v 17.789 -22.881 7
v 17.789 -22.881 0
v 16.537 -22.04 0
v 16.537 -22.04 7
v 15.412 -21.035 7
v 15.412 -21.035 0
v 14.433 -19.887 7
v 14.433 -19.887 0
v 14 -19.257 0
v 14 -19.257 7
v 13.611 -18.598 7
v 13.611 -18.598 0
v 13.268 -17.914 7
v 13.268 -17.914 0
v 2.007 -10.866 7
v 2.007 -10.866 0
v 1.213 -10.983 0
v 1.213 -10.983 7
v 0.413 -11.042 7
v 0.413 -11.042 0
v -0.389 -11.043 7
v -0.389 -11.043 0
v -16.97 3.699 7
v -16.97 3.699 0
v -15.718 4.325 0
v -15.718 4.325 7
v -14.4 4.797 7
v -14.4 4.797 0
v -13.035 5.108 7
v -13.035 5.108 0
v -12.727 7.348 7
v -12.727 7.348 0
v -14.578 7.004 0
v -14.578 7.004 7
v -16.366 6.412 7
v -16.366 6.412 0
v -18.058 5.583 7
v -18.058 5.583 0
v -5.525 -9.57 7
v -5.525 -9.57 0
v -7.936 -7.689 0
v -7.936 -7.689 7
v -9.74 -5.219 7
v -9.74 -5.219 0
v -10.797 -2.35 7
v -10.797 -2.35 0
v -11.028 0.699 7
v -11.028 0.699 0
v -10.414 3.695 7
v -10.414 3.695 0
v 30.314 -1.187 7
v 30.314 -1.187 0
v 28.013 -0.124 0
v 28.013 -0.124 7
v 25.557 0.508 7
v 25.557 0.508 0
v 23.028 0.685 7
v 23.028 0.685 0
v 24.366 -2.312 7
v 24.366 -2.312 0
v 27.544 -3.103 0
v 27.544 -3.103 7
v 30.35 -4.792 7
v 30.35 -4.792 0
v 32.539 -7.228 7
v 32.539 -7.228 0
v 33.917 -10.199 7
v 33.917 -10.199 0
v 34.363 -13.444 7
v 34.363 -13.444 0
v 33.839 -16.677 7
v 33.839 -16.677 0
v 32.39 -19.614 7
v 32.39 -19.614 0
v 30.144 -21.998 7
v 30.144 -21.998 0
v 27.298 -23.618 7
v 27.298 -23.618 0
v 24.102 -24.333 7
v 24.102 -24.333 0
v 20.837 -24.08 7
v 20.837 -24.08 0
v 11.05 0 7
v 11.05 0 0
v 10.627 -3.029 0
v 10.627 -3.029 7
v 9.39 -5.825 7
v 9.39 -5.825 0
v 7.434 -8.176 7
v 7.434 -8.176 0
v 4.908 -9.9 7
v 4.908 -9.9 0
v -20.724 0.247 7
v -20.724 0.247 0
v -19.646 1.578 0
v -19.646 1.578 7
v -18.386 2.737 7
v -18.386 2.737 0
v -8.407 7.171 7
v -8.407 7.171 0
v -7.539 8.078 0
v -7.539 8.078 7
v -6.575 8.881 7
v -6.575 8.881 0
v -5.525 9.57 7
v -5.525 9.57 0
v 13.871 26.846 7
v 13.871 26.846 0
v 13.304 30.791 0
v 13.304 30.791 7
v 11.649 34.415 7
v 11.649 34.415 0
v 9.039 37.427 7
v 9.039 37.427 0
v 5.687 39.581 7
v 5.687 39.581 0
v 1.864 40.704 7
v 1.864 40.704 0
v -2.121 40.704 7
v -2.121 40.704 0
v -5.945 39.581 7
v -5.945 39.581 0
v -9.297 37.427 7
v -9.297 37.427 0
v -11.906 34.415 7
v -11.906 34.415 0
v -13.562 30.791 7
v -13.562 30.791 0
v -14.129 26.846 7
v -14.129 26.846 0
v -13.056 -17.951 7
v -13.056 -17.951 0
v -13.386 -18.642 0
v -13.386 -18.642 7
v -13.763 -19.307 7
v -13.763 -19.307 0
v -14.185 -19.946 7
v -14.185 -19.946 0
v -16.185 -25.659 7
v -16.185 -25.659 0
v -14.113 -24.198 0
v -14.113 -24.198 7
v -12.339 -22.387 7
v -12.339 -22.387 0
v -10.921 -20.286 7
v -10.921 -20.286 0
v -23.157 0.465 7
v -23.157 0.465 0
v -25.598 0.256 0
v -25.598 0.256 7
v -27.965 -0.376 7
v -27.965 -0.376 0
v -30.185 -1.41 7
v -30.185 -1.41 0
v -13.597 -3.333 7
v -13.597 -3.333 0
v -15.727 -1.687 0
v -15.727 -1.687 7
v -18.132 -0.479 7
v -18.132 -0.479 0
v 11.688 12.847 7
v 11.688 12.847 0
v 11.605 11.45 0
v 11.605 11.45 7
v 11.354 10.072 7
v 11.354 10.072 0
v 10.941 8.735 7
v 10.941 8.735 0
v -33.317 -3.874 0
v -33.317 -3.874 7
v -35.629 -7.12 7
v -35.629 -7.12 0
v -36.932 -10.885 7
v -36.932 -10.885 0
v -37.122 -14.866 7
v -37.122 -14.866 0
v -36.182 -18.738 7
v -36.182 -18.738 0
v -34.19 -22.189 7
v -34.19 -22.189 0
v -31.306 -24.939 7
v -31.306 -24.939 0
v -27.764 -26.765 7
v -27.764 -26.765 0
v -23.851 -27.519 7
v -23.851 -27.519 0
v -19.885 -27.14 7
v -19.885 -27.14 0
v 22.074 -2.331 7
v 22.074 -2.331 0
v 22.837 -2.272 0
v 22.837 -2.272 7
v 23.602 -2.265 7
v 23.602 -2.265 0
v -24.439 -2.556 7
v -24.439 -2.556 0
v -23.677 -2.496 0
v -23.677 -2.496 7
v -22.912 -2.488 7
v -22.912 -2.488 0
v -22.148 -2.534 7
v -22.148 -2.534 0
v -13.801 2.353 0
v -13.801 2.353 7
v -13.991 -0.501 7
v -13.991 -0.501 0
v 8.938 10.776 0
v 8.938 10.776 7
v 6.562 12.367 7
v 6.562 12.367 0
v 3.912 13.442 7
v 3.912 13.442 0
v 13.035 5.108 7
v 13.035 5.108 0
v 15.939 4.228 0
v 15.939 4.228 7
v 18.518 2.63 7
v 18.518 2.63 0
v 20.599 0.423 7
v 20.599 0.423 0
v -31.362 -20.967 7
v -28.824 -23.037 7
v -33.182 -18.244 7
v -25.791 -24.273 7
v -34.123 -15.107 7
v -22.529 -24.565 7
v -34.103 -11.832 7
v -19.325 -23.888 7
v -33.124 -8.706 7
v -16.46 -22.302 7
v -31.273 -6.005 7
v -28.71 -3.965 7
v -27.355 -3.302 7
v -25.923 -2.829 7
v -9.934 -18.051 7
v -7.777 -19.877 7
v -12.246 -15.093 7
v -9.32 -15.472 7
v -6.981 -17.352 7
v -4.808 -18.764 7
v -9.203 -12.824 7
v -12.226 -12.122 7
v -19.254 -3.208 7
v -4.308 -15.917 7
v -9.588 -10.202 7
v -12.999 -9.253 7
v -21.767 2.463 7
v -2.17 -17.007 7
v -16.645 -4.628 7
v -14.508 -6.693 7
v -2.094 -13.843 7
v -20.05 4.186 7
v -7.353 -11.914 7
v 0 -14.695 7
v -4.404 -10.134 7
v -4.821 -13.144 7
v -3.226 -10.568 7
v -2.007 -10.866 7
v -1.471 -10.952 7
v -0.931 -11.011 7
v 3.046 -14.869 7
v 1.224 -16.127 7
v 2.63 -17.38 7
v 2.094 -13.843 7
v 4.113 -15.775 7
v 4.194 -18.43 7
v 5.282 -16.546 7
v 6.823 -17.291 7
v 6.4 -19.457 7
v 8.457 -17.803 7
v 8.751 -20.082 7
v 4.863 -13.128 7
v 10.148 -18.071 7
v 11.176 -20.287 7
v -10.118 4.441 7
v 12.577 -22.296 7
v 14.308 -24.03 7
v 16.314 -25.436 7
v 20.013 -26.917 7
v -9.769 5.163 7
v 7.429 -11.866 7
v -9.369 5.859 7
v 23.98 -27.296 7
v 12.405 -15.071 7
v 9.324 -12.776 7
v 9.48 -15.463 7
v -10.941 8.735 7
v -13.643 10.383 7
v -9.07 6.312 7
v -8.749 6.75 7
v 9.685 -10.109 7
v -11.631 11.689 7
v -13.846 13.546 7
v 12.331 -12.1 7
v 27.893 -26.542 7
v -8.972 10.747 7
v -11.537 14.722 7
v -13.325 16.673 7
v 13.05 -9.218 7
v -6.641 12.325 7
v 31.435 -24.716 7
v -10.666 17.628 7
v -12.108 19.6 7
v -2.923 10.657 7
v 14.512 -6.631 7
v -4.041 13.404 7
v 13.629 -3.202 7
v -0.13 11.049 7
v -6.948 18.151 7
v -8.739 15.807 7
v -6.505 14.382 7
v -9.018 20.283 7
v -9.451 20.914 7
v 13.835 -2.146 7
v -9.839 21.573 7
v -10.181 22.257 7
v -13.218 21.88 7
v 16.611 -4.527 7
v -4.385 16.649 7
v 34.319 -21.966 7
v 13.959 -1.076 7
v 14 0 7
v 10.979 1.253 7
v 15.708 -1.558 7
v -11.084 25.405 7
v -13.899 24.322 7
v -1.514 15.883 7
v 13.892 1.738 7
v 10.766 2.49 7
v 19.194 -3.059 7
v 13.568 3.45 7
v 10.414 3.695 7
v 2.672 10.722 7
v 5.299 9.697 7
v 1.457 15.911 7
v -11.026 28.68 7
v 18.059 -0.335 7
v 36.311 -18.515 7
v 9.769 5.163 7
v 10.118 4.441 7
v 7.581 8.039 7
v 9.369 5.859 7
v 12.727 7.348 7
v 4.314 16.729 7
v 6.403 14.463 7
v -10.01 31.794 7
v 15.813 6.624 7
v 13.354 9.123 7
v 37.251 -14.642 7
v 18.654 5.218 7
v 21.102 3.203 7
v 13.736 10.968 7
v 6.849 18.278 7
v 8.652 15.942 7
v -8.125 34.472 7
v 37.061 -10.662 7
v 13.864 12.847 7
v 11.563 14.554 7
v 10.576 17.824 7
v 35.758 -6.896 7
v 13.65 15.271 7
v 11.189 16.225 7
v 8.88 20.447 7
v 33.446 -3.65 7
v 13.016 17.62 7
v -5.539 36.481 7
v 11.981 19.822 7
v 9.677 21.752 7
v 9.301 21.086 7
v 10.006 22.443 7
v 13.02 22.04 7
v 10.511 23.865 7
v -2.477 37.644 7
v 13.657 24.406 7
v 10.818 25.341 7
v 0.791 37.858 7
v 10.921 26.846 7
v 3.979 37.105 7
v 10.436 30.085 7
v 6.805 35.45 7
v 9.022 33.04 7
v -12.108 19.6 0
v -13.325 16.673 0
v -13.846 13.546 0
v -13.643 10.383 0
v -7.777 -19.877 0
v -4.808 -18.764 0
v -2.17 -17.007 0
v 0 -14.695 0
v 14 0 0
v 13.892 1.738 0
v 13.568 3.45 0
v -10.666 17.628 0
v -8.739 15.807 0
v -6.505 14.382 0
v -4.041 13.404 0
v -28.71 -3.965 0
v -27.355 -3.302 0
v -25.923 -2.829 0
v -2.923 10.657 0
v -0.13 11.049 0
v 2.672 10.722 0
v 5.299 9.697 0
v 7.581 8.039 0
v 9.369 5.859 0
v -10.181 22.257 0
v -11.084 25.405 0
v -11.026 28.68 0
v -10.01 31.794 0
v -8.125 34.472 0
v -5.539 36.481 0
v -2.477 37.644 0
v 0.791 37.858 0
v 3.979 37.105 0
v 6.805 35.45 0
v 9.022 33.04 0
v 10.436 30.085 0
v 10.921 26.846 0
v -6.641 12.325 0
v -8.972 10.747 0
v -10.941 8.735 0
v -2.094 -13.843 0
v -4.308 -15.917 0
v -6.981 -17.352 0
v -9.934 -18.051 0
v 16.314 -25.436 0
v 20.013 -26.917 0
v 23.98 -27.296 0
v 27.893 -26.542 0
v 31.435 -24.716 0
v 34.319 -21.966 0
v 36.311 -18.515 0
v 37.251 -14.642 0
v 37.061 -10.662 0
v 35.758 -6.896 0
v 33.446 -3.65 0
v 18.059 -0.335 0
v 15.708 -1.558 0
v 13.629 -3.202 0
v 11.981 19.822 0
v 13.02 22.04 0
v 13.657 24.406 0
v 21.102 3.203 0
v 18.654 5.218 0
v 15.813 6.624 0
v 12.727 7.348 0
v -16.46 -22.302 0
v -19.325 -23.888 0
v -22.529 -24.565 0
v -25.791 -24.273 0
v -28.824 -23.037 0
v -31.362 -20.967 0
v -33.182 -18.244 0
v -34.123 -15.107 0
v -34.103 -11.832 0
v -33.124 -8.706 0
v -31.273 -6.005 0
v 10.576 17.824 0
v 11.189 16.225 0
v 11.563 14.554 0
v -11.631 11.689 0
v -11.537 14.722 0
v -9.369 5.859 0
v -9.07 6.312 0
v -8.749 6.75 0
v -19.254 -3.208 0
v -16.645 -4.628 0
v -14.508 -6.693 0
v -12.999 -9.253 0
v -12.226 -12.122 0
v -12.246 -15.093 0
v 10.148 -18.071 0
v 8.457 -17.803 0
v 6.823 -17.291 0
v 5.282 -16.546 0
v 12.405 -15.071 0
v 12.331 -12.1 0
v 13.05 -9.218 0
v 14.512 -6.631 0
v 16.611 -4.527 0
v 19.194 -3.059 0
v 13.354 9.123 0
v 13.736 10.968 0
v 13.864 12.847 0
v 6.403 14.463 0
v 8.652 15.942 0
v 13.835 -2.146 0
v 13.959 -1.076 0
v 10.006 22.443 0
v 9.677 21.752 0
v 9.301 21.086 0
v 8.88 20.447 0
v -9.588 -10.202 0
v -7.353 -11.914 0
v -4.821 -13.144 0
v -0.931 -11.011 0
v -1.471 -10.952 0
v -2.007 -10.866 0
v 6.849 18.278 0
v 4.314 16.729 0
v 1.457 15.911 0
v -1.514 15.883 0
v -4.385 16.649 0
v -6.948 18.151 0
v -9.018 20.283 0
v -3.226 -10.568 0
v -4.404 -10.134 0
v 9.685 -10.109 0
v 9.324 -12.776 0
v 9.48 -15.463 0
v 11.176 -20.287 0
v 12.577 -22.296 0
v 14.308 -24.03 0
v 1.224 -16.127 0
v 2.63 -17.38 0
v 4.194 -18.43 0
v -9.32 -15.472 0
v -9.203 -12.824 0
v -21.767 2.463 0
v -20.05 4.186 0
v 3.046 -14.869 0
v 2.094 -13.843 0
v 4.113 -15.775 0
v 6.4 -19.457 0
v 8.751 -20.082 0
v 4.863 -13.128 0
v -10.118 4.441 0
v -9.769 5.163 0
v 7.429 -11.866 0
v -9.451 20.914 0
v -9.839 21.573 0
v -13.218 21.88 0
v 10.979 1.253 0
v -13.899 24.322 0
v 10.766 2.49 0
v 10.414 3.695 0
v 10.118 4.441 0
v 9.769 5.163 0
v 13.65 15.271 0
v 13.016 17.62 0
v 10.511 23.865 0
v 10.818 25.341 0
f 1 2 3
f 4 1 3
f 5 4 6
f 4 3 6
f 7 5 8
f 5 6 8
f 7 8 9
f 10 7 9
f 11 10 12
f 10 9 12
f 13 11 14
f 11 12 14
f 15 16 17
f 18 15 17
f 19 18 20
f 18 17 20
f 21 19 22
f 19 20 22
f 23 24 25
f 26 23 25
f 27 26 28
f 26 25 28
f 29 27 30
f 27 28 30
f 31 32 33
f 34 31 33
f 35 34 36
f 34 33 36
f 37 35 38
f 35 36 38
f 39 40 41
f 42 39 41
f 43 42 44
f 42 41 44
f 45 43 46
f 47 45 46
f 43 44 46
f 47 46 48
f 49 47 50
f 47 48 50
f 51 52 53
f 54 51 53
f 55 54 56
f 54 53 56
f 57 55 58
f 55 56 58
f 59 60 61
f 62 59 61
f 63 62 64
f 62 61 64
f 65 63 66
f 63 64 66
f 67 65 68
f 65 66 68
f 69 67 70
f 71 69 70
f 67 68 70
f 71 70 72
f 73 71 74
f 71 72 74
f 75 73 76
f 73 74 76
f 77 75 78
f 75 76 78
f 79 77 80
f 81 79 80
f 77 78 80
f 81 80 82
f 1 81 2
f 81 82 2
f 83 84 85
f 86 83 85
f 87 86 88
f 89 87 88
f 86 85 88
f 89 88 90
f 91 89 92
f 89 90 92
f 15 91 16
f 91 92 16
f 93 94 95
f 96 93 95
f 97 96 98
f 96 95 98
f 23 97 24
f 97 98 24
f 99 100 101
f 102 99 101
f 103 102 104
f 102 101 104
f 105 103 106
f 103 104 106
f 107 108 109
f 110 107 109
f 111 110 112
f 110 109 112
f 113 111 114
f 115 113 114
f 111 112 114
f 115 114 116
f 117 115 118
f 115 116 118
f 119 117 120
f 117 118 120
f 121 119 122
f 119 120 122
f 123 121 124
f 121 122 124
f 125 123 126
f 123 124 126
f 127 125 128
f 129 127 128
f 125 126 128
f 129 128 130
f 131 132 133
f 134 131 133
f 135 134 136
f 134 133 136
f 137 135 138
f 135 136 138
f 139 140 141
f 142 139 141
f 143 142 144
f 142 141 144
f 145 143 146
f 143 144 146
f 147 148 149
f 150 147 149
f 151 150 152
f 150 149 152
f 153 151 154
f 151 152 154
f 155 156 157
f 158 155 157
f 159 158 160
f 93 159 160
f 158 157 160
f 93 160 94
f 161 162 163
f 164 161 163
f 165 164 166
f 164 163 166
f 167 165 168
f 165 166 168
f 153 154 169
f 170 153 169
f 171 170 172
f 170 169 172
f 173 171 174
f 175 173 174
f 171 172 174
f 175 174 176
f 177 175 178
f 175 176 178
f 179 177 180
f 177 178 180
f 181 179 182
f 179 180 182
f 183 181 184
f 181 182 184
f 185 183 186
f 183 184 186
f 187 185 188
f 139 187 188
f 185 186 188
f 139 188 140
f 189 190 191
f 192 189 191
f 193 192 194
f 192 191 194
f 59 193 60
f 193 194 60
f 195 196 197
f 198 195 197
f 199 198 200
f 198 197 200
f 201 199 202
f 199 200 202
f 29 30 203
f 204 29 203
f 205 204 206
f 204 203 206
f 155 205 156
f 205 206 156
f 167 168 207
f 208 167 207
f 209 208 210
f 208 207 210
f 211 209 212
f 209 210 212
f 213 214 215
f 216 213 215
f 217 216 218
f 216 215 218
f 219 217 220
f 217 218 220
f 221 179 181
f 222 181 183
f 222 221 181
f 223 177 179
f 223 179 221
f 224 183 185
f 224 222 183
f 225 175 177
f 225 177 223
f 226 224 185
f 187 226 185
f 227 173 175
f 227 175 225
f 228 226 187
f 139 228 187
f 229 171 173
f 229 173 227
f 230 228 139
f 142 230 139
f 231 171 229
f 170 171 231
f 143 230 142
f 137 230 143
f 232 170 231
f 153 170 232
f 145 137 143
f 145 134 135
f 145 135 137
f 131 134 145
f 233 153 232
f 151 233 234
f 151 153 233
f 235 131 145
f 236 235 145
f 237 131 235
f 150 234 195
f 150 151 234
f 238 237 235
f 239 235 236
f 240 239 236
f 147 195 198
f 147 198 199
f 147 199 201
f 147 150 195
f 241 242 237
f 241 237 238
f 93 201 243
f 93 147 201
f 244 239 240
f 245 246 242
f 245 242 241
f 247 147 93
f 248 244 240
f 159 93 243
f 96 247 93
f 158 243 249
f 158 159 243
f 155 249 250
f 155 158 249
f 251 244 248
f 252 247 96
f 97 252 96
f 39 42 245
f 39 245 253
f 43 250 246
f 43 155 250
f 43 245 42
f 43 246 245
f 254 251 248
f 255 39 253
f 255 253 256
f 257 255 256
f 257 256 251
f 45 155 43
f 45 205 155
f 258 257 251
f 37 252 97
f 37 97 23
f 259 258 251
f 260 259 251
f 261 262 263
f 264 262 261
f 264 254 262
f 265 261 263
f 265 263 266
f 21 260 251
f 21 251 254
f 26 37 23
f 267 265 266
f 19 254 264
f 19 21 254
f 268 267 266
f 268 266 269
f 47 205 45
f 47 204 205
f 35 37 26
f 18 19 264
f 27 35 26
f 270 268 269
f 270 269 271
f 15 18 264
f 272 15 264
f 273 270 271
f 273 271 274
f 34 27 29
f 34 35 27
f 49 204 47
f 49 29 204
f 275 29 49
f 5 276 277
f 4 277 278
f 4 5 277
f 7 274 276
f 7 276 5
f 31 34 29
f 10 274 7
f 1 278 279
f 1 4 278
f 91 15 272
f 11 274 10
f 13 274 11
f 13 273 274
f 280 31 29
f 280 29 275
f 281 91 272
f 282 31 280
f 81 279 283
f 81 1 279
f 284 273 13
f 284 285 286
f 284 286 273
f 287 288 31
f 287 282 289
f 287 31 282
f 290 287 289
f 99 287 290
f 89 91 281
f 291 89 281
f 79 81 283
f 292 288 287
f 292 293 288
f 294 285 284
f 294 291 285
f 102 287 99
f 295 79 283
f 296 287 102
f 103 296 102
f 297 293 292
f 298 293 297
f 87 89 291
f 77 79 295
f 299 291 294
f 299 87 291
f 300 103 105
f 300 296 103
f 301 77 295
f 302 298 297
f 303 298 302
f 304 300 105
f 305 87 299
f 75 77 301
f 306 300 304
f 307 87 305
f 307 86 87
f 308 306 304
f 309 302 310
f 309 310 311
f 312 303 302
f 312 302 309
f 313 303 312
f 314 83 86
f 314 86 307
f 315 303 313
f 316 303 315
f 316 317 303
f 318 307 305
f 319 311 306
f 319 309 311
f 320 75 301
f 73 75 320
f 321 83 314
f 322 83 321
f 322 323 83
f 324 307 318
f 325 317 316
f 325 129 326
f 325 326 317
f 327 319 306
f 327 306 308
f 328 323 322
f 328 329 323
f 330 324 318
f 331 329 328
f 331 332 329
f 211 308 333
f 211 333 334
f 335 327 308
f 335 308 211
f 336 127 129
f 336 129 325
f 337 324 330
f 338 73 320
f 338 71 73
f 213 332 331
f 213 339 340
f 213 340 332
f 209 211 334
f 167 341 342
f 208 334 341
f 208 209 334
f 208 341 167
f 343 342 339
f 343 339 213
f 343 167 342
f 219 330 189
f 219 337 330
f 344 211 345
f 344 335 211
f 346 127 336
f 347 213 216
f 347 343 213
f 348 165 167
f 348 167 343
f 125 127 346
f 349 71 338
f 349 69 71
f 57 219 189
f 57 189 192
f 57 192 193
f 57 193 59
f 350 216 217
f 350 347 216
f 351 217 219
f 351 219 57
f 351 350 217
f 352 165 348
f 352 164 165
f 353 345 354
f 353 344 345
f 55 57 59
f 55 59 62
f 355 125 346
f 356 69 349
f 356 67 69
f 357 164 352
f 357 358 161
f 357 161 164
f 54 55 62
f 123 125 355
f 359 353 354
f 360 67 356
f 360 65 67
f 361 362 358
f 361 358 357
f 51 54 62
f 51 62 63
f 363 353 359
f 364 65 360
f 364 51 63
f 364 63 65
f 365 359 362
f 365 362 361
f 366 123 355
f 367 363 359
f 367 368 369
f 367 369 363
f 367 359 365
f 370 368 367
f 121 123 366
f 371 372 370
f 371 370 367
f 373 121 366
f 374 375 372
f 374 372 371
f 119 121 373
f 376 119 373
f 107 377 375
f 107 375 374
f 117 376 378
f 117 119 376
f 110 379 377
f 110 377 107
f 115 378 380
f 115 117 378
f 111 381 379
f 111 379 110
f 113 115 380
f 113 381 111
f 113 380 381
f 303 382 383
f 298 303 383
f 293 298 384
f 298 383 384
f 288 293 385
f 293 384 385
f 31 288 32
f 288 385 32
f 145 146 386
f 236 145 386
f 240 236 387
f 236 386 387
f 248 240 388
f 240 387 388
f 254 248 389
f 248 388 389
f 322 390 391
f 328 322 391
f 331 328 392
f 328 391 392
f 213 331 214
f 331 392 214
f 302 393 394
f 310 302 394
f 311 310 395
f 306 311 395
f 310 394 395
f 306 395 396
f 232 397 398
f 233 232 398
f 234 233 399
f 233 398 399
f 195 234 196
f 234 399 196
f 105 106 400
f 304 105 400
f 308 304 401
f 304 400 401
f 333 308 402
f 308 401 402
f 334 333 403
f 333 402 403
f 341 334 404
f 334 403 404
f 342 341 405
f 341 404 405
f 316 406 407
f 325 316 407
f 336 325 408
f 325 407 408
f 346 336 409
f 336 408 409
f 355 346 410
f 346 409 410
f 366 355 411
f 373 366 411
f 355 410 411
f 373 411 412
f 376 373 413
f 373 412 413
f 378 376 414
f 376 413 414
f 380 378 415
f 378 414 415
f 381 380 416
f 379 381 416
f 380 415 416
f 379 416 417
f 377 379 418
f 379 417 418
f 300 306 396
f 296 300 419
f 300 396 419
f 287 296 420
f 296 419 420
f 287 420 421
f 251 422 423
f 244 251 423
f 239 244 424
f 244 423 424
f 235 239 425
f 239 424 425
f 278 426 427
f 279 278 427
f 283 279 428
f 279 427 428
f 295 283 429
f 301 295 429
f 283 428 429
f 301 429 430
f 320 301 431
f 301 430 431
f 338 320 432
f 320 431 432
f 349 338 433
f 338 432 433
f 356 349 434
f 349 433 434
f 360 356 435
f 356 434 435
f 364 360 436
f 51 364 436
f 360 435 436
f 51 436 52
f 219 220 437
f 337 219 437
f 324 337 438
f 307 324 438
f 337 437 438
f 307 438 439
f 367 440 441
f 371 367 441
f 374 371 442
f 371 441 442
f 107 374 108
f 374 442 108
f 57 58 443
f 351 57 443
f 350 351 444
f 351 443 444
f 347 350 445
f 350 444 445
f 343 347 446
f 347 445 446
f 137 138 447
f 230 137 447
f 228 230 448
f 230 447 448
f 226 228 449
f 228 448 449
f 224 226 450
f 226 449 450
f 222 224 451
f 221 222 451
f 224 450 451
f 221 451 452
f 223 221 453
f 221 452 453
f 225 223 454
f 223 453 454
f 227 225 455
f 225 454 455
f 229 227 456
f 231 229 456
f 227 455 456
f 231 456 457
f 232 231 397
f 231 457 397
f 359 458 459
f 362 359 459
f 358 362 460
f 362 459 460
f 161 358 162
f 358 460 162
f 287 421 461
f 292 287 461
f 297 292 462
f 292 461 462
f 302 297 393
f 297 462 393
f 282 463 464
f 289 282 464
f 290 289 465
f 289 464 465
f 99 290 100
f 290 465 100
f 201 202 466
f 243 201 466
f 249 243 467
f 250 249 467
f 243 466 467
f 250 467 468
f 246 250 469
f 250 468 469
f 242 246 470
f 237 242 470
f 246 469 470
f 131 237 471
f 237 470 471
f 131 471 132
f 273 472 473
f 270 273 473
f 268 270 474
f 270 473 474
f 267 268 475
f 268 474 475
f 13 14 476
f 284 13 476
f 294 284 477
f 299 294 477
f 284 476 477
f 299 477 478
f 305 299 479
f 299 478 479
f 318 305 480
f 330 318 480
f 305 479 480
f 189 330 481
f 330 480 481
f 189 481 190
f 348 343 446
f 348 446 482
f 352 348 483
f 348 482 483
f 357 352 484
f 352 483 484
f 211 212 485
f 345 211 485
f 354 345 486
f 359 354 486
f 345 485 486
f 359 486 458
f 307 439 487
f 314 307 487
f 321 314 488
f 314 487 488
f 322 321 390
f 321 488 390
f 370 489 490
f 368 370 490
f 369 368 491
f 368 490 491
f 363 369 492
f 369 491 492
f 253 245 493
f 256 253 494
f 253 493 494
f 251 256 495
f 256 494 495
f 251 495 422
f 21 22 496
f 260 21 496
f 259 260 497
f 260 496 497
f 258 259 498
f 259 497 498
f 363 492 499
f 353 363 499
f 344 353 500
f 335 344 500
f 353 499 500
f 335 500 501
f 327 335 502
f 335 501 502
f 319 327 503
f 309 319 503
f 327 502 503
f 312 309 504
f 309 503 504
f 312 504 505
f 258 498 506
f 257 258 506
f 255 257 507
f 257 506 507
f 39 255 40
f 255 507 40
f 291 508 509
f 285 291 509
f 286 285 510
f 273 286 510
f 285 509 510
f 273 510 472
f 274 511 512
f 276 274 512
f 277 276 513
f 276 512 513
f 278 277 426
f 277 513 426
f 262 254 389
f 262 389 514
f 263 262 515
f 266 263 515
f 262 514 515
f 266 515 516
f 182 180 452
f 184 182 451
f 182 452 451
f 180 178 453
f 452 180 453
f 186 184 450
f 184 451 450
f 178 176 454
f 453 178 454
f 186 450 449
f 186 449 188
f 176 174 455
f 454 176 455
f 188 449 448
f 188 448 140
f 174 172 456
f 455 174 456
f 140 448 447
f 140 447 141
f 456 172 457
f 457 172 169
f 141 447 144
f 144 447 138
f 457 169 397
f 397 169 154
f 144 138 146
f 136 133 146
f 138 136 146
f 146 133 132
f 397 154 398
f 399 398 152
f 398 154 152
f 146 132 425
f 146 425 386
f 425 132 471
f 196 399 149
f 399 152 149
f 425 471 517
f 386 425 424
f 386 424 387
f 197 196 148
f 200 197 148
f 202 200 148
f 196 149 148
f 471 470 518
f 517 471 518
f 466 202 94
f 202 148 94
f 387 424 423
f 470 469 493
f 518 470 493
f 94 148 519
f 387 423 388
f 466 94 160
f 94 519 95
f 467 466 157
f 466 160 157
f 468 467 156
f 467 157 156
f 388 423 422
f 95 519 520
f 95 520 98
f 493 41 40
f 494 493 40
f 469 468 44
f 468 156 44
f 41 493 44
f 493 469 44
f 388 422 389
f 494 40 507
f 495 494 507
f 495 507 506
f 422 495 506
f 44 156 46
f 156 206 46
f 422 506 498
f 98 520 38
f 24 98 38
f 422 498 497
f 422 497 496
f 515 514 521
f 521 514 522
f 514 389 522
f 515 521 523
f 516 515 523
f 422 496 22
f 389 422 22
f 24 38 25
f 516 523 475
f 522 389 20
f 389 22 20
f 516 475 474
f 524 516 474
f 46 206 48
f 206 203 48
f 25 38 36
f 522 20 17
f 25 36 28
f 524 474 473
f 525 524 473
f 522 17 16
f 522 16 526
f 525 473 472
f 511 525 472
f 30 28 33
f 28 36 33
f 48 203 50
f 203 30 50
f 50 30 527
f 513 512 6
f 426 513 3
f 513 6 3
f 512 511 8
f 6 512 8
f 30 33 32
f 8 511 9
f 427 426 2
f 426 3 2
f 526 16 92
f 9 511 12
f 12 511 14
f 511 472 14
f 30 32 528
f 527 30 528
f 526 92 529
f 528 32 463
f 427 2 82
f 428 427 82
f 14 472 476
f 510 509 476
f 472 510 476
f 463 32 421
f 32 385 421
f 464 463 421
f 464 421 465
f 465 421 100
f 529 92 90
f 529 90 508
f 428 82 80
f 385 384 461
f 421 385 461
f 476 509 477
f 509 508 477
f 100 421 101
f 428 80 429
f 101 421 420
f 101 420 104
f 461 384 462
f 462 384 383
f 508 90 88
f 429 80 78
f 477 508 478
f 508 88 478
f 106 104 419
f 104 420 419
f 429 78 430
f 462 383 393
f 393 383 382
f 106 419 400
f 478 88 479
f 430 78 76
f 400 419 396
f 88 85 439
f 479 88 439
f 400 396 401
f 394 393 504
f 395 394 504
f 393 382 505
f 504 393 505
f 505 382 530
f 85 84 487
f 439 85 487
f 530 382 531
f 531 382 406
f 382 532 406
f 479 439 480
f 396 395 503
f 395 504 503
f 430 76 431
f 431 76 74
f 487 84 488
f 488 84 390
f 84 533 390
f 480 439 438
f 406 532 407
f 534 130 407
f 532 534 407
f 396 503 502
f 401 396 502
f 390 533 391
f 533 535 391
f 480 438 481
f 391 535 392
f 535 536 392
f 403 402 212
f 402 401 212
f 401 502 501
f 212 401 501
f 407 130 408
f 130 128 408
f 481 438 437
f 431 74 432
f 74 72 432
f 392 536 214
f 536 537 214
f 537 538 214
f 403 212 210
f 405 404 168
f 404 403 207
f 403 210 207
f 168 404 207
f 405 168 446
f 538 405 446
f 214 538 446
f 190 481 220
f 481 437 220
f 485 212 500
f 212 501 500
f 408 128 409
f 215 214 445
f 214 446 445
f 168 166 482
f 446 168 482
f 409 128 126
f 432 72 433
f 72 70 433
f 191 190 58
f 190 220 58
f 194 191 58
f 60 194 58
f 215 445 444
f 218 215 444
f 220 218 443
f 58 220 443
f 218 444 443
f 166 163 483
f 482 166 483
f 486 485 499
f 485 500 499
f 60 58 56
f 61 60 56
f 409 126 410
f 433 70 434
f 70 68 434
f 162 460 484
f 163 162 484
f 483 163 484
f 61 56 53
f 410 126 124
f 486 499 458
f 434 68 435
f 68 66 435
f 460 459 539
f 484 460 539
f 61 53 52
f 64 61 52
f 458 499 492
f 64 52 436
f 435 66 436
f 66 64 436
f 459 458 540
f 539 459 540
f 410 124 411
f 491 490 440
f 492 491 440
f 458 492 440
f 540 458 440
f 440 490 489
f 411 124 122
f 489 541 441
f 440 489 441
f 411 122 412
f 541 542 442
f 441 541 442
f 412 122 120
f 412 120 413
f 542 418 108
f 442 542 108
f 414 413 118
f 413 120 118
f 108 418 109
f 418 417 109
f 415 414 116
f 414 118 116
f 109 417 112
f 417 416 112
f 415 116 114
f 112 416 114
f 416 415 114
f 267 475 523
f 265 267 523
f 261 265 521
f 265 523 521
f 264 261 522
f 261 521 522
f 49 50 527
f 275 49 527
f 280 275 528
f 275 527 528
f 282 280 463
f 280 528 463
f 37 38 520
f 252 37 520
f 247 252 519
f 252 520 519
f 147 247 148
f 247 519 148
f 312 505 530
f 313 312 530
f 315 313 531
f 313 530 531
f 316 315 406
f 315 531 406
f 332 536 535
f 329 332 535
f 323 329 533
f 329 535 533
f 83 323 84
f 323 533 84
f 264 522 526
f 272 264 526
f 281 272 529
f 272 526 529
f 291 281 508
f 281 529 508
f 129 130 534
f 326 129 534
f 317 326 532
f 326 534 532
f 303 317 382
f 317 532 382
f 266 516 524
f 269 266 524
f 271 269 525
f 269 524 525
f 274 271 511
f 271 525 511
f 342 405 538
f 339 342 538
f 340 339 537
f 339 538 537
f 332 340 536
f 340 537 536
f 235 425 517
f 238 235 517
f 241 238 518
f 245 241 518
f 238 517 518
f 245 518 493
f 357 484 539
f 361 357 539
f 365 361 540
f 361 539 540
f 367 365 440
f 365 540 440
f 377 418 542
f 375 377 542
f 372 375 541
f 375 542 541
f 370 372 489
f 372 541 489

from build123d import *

# Parameters (mm, degrees)
F1_DEPTH = 7
F2_DEPTH = 7
F3_COUNT = 3


with BuildPart() as f1:
    # F0 (on Top) → F1 (new body)
    with BuildSketch(Plane.XY):
        with BuildLine():
            ThreePointArc((11.9814563539, 19.822065477), (13.3904833189, 23.2093401836), (13.8711614234, 26.8463630714))
            Line((13.8711614234, 26.8463630714), (10.9211614234, 26.8463630714))
            ThreePointArc((10.9211614234, 26.8463630714), (10.6899476462, 24.5977268922), (10.0059822983, 22.4431930958))
            ThreePointArc((10.0059822983, 22.4431930958), (11.0715600581, 21.1912957723), (11.9814563539, 19.822065477))
        make_face()
        with BuildLine():
            Line((10.9211614234, 26.8463630714), (13.8711614234, 26.8463630714))
            ThreePointArc((13.8711614234, 26.8463630714), (-0.1288385766, 40.8463630714), (-14.1288385766, 26.8463630714))
            Line((-14.1288385766, 26.8463630714), (-11.1788385766, 26.8463630714))
            ThreePointArc((-11.1788385766, 26.8463630714), (-0.1288385766, 37.8963630714), (10.9211614234, 26.8463630714))
        make_face()
        with BuildLine():
            Line((-11.1788385766, 26.8463630714), (-14.1288385766, 26.8463630714))
            ThreePointArc((-14.1288385766, 26.8463630714), (-13.6141173472, 23.0850791844), (-12.1078019368, 19.6003685354))
            ThreePointArc((-12.1078019368, 19.6003685354), (-11.2232600764, 20.9861133056), (-10.1809036398, 22.2574102536))
            ThreePointArc((-10.1809036398, 22.2574102536), (-10.9264730154, 24.4982594694), (-11.1788385766, 26.8463630714))
        make_face()
        with BuildLine():
            ThreePointArc((13.8638901362, 12.8469559189), (13.3850110996, 16.4592858558), (11.9814563539, 19.822065477))
            ThreePointArc((11.9814563539, 19.822065477), (11.3223593376, 18.7921674983), (10.5759119571, 17.8237073642))
            ThreePointArc((10.5759119571, 17.8237073642), (11.4068648101, 15.3967409836), (11.6883689483, 12.8469559189))
            ThreePointArc((11.6883689483, 12.8469559189), (11.5000217752, 10.7571071583), (10.9410503341, 8.7346103282))
            ThreePointArc((10.9410503341, 8.7346103282), (11.7016712993, 7.6857588306), (12.3620737952, 6.5710829764))
            ThreePointArc((12.3620737952, 6.5710829764), (13.4832096079, 9.6204239761), (13.8638901362, 12.8469559189))
        make_face()
        with BuildLine():
            ThreePointArc((10.5759119571, 17.8237073642), (11.3223593376, 18.7921674983), (11.9814563539, 19.822065477))
            ThreePointArc((11.9814563539, 19.822065477), (11.0715600581, 21.1912957723), (10.0059822983, 22.4431930958))
            ThreePointArc((10.0059822983, 22.4431930958), (9.4947756455, 21.4160270502), (8.879815604, 20.4474061365))
            ThreePointArc((8.879815604, 20.4474061365), (9.8159198522, 19.1924808087), (10.5759119571, 17.8237073642))
        make_face()
        with BuildLine():
            ThreePointArc((-10.1809036398, 22.2574102536), (-11.2232600764, 20.9861133056), (-12.1078019368, 19.6003685354))
            ThreePointArc((-12.1078019368, 19.6003685354), (-11.4298615634, 18.582775506), (-10.6657163684, 17.6282175746))
            ThreePointArc((-10.6657163684, 17.6282175746), (-9.9310448999, 19.010746625), (-9.0181957741, 20.2826881392))
            ThreePointArc((-9.0181957741, 20.2826881392), (-9.6508788607, 21.239826812), (-10.1809036398, 22.2574102536))
        make_face()
        with BuildLine():
            ThreePointArc((-10.6657163684, 17.6282175746), (-11.4298615634, 18.582775506), (-12.1078019368, 19.6003685354))
            ThreePointArc((-12.1078019368, 19.6003685354), (-13.8612508501, 13.1174639217), (-12.3620737952, 6.5710829764))
            ThreePointArc((-12.3620737952, 6.5710829764), (-11.7016712993, 7.6857588306), (-10.9410503341, 8.7346103282))
            ThreePointArc((-10.9410503341, 8.7346103282), (-11.6827716873, 13.2086386164), (-10.6657163684, 17.6282175746))
        make_face()
        with BuildLine():
            ThreePointArc((-10.4139033154, 3.695012549), (-11.478424483, 5.0717889691), (-12.3620737952, 6.5710829764))
            ThreePointArc((-12.3620737952, 6.5710829764), (-3.3860719771, -13.5843482201), (14, 0))
            ThreePointArc((14, 0), (13.5843482201, 3.3860719771), (12.3620737952, 6.5710829764))
            ThreePointArc((12.3620737952, 6.5710829764), (11.478424483, 5.0717889691), (10.4139033154, 3.695012549))
            ThreePointArc((10.4139033154, 3.695012549), (10.8898147743, 1.8746824217), (11.05, 0))
            ThreePointArc((11.05, 0), (-1.8746824217, -10.8898147743), (-10.4139033154, 3.695012549))
        make_face()
        with BuildLine():
            ThreePointArc((-10.9410503341, 8.7346103282), (-11.7016712993, 7.6857588306), (-12.3620737952, 6.5710829764))
            ThreePointArc((-12.3620737952, 6.5710829764), (-11.478424483, 5.0717889691), (-10.4139033154, 3.695012549))
            ThreePointArc((-10.4139033154, 3.695012549), (-9.9504776126, 4.8052570462), (-9.3690986882, 5.8585399009))
            ThreePointArc((-9.3690986882, 5.8585399009), (-10.2563874539, 7.2412012803), (-10.9410503341, 8.7346103282))
        make_face()
        with BuildLine():
            ThreePointArc((10.4139033154, 3.695012549), (11.478424483, 5.0717889691), (12.3620737952, 6.5710829764))
            ThreePointArc((12.3620737952, 6.5710829764), (11.7016712993, 7.6857588306), (10.9410503341, 8.7346103282))
            ThreePointArc((10.9410503341, 8.7346103282), (10.2563874539, 7.2412012803), (9.3690986882, 5.8585399009))
            ThreePointArc((9.3690986882, 5.8585399009), (9.9504776126, 4.8052570462), (10.4139033154, 3.695012549))
        make_face()
        with BuildLine():
            ThreePointArc((3.9122229389, 13.4422658684), (7.5626502677, 15.1484573034), (10.5759119571, 17.8237073642))
            ThreePointArc((10.5759119571, 17.8237073642), (9.8159198522, 19.1924808087), (8.879815604, 20.4474061365))
            ThreePointArc((8.879815604, 20.4474061365), (-0.0271481286, 15.7968309975), (-9.0181957741, 20.2826881392))
            ThreePointArc((-9.0181957741, 20.2826881392), (-9.9310448999, 19.010746625), (-10.6657163684, 17.6282175746))
            ThreePointArc((-10.6657163684, 17.6282175746), (-7.6557852491, 15.0419116318), (-4.0410615155, 13.404097203))
            ThreePointArc((-4.0410615155, 13.404097203), (-0.0671867283, 13.9998387828), (3.9122229389, 13.4422658684))
        make_face()
        with BuildLine():
            ThreePointArc((10.9410503341, 8.7346103282), (7.7907276234, 11.6320489639), (3.9122229389, 13.4422658684))
            ThreePointArc((3.9122229389, 13.4422658684), (-0.0616518483, 12.8465242886), (-4.0410615155, 13.404097203))
            ThreePointArc((-4.0410615155, 13.404097203), (-7.8464607172, 11.5945269077), (-10.9410503341, 8.7346103282))
            ThreePointArc((-10.9410503341, 8.7346103282), (-10.2563874539, 7.2412012803), (-9.3690986882, 5.8585399009))
            ThreePointArc((-9.3690986882, 5.8585399009), (0, 11.05), (9.3690986882, 5.8585399009))
            ThreePointArc((9.3690986882, 5.8585399009), (10.2563874539, 7.2412012803), (10.9410503341, 8.7346103282))
        make_face()
        with BuildLine():
            ThreePointArc((-4.0410615155, 13.404097203), (-0.0616518483, 12.8465242886), (3.9122229389, 13.4422658684))
            ThreePointArc((3.9122229389, 13.4422658684), (-0.0671867283, 13.9998387828), (-4.0410615155, 13.404097203))
        make_face()
    extrude(amount=F1_DEPTH)

    # F0 (on Top) → F2 (join)
    with BuildSketch(Plane.XY):
        with BuildLine():
            ThreePointArc((11.9814563539, 19.822065477), (13.3904833189, 23.2093401836), (13.8711614234, 26.8463630714))
            Line((13.8711614234, 26.8463630714), (10.9211614234, 26.8463630714))
            ThreePointArc((10.9211614234, 26.8463630714), (10.6899476462, 24.5977268922), (10.0059822983, 22.4431930958))
            ThreePointArc((10.0059822983, 22.4431930958), (11.0715600581, 21.1912957723), (11.9814563539, 19.822065477))
        make_face()
        with BuildLine():
            Line((10.9211614234, 26.8463630714), (13.8711614234, 26.8463630714))
            ThreePointArc((13.8711614234, 26.8463630714), (-0.1288385766, 40.8463630714), (-14.1288385766, 26.8463630714))
            Line((-14.1288385766, 26.8463630714), (-11.1788385766, 26.8463630714))
            ThreePointArc((-11.1788385766, 26.8463630714), (-0.1288385766, 37.8963630714), (10.9211614234, 26.8463630714))
        make_face()
        with BuildLine():
            Line((-11.1788385766, 26.8463630714), (-14.1288385766, 26.8463630714))
            ThreePointArc((-14.1288385766, 26.8463630714), (-13.6141173472, 23.0850791844), (-12.1078019368, 19.6003685354))
            ThreePointArc((-12.1078019368, 19.6003685354), (-11.2232600764, 20.9861133056), (-10.1809036398, 22.2574102536))
            ThreePointArc((-10.1809036398, 22.2574102536), (-10.9264730154, 24.4982594694), (-11.1788385766, 26.8463630714))
        make_face()
        with BuildLine():
            ThreePointArc((13.8638901362, 12.8469559189), (13.3850110996, 16.4592858558), (11.9814563539, 19.822065477))
            ThreePointArc((11.9814563539, 19.822065477), (11.3223593376, 18.7921674983), (10.5759119571, 17.8237073642))
            ThreePointArc((10.5759119571, 17.8237073642), (11.4068648101, 15.3967409836), (11.6883689483, 12.8469559189))
            ThreePointArc((11.6883689483, 12.8469559189), (11.5000217752, 10.7571071583), (10.9410503341, 8.7346103282))
            ThreePointArc((10.9410503341, 8.7346103282), (11.7016712993, 7.6857588306), (12.3620737952, 6.5710829764))
            ThreePointArc((12.3620737952, 6.5710829764), (13.4832096079, 9.6204239761), (13.8638901362, 12.8469559189))
        make_face()
        with BuildLine():
            ThreePointArc((10.5759119571, 17.8237073642), (11.3223593376, 18.7921674983), (11.9814563539, 19.822065477))
            ThreePointArc((11.9814563539, 19.822065477), (11.0715600581, 21.1912957723), (10.0059822983, 22.4431930958))
            ThreePointArc((10.0059822983, 22.4431930958), (9.4947756455, 21.4160270502), (8.879815604, 20.4474061365))
            ThreePointArc((8.879815604, 20.4474061365), (9.8159198522, 19.1924808087), (10.5759119571, 17.8237073642))
        make_face()
        with BuildLine():
            ThreePointArc((-10.1809036398, 22.2574102536), (-11.2232600764, 20.9861133056), (-12.1078019368, 19.6003685354))
            ThreePointArc((-12.1078019368, 19.6003685354), (-11.4298615634, 18.582775506), (-10.6657163684, 17.6282175746))
            ThreePointArc((-10.6657163684, 17.6282175746), (-9.9310448999, 19.010746625), (-9.0181957741, 20.2826881392))
            ThreePointArc((-9.0181957741, 20.2826881392), (-9.6508788607, 21.239826812), (-10.1809036398, 22.2574102536))
        make_face()
        with BuildLine():
            ThreePointArc((-10.6657163684, 17.6282175746), (-11.4298615634, 18.582775506), (-12.1078019368, 19.6003685354))
            ThreePointArc((-12.1078019368, 19.6003685354), (-13.8612508501, 13.1174639217), (-12.3620737952, 6.5710829764))
            ThreePointArc((-12.3620737952, 6.5710829764), (-11.7016712993, 7.6857588306), (-10.9410503341, 8.7346103282))
            ThreePointArc((-10.9410503341, 8.7346103282), (-11.6827716873, 13.2086386164), (-10.6657163684, 17.6282175746))
        make_face()
        with BuildLine():
            ThreePointArc((-10.4139033154, 3.695012549), (-11.478424483, 5.0717889691), (-12.3620737952, 6.5710829764))
            ThreePointArc((-12.3620737952, 6.5710829764), (-3.3860719771, -13.5843482201), (14, 0))
            ThreePointArc((14, 0), (13.5843482201, 3.3860719771), (12.3620737952, 6.5710829764))
            ThreePointArc((12.3620737952, 6.5710829764), (11.478424483, 5.0717889691), (10.4139033154, 3.695012549))
            ThreePointArc((10.4139033154, 3.695012549), (10.8898147743, 1.8746824217), (11.05, 0))
            ThreePointArc((11.05, 0), (-1.8746824217, -10.8898147743), (-10.4139033154, 3.695012549))
        make_face()
        with BuildLine():
            ThreePointArc((-10.9410503341, 8.7346103282), (-11.7016712993, 7.6857588306), (-12.3620737952, 6.5710829764))
            ThreePointArc((-12.3620737952, 6.5710829764), (-11.478424483, 5.0717889691), (-10.4139033154, 3.695012549))
            ThreePointArc((-10.4139033154, 3.695012549), (-9.9504776126, 4.8052570462), (-9.3690986882, 5.8585399009))
            ThreePointArc((-9.3690986882, 5.8585399009), (-10.2563874539, 7.2412012803), (-10.9410503341, 8.7346103282))
        make_face()
        with BuildLine():
            ThreePointArc((10.4139033154, 3.695012549), (11.478424483, 5.0717889691), (12.3620737952, 6.5710829764))
            ThreePointArc((12.3620737952, 6.5710829764), (11.7016712993, 7.6857588306), (10.9410503341, 8.7346103282))
            ThreePointArc((10.9410503341, 8.7346103282), (10.2563874539, 7.2412012803), (9.3690986882, 5.8585399009))
            ThreePointArc((9.3690986882, 5.8585399009), (9.9504776126, 4.8052570462), (10.4139033154, 3.695012549))
        make_face()
    extrude(amount=F2_DEPTH)

    # F3: F1 ×3 about axis
    f3_axis = Axis((0, 0, 0), (0, 0, 1))


with BuildPart() as f1_1:
    add(f1.part)
    for i in range(1, F3_COUNT):
        add(f1.part.rotate(f3_axis, i * 360 / F3_COUNT))


solid = f1_1.part
